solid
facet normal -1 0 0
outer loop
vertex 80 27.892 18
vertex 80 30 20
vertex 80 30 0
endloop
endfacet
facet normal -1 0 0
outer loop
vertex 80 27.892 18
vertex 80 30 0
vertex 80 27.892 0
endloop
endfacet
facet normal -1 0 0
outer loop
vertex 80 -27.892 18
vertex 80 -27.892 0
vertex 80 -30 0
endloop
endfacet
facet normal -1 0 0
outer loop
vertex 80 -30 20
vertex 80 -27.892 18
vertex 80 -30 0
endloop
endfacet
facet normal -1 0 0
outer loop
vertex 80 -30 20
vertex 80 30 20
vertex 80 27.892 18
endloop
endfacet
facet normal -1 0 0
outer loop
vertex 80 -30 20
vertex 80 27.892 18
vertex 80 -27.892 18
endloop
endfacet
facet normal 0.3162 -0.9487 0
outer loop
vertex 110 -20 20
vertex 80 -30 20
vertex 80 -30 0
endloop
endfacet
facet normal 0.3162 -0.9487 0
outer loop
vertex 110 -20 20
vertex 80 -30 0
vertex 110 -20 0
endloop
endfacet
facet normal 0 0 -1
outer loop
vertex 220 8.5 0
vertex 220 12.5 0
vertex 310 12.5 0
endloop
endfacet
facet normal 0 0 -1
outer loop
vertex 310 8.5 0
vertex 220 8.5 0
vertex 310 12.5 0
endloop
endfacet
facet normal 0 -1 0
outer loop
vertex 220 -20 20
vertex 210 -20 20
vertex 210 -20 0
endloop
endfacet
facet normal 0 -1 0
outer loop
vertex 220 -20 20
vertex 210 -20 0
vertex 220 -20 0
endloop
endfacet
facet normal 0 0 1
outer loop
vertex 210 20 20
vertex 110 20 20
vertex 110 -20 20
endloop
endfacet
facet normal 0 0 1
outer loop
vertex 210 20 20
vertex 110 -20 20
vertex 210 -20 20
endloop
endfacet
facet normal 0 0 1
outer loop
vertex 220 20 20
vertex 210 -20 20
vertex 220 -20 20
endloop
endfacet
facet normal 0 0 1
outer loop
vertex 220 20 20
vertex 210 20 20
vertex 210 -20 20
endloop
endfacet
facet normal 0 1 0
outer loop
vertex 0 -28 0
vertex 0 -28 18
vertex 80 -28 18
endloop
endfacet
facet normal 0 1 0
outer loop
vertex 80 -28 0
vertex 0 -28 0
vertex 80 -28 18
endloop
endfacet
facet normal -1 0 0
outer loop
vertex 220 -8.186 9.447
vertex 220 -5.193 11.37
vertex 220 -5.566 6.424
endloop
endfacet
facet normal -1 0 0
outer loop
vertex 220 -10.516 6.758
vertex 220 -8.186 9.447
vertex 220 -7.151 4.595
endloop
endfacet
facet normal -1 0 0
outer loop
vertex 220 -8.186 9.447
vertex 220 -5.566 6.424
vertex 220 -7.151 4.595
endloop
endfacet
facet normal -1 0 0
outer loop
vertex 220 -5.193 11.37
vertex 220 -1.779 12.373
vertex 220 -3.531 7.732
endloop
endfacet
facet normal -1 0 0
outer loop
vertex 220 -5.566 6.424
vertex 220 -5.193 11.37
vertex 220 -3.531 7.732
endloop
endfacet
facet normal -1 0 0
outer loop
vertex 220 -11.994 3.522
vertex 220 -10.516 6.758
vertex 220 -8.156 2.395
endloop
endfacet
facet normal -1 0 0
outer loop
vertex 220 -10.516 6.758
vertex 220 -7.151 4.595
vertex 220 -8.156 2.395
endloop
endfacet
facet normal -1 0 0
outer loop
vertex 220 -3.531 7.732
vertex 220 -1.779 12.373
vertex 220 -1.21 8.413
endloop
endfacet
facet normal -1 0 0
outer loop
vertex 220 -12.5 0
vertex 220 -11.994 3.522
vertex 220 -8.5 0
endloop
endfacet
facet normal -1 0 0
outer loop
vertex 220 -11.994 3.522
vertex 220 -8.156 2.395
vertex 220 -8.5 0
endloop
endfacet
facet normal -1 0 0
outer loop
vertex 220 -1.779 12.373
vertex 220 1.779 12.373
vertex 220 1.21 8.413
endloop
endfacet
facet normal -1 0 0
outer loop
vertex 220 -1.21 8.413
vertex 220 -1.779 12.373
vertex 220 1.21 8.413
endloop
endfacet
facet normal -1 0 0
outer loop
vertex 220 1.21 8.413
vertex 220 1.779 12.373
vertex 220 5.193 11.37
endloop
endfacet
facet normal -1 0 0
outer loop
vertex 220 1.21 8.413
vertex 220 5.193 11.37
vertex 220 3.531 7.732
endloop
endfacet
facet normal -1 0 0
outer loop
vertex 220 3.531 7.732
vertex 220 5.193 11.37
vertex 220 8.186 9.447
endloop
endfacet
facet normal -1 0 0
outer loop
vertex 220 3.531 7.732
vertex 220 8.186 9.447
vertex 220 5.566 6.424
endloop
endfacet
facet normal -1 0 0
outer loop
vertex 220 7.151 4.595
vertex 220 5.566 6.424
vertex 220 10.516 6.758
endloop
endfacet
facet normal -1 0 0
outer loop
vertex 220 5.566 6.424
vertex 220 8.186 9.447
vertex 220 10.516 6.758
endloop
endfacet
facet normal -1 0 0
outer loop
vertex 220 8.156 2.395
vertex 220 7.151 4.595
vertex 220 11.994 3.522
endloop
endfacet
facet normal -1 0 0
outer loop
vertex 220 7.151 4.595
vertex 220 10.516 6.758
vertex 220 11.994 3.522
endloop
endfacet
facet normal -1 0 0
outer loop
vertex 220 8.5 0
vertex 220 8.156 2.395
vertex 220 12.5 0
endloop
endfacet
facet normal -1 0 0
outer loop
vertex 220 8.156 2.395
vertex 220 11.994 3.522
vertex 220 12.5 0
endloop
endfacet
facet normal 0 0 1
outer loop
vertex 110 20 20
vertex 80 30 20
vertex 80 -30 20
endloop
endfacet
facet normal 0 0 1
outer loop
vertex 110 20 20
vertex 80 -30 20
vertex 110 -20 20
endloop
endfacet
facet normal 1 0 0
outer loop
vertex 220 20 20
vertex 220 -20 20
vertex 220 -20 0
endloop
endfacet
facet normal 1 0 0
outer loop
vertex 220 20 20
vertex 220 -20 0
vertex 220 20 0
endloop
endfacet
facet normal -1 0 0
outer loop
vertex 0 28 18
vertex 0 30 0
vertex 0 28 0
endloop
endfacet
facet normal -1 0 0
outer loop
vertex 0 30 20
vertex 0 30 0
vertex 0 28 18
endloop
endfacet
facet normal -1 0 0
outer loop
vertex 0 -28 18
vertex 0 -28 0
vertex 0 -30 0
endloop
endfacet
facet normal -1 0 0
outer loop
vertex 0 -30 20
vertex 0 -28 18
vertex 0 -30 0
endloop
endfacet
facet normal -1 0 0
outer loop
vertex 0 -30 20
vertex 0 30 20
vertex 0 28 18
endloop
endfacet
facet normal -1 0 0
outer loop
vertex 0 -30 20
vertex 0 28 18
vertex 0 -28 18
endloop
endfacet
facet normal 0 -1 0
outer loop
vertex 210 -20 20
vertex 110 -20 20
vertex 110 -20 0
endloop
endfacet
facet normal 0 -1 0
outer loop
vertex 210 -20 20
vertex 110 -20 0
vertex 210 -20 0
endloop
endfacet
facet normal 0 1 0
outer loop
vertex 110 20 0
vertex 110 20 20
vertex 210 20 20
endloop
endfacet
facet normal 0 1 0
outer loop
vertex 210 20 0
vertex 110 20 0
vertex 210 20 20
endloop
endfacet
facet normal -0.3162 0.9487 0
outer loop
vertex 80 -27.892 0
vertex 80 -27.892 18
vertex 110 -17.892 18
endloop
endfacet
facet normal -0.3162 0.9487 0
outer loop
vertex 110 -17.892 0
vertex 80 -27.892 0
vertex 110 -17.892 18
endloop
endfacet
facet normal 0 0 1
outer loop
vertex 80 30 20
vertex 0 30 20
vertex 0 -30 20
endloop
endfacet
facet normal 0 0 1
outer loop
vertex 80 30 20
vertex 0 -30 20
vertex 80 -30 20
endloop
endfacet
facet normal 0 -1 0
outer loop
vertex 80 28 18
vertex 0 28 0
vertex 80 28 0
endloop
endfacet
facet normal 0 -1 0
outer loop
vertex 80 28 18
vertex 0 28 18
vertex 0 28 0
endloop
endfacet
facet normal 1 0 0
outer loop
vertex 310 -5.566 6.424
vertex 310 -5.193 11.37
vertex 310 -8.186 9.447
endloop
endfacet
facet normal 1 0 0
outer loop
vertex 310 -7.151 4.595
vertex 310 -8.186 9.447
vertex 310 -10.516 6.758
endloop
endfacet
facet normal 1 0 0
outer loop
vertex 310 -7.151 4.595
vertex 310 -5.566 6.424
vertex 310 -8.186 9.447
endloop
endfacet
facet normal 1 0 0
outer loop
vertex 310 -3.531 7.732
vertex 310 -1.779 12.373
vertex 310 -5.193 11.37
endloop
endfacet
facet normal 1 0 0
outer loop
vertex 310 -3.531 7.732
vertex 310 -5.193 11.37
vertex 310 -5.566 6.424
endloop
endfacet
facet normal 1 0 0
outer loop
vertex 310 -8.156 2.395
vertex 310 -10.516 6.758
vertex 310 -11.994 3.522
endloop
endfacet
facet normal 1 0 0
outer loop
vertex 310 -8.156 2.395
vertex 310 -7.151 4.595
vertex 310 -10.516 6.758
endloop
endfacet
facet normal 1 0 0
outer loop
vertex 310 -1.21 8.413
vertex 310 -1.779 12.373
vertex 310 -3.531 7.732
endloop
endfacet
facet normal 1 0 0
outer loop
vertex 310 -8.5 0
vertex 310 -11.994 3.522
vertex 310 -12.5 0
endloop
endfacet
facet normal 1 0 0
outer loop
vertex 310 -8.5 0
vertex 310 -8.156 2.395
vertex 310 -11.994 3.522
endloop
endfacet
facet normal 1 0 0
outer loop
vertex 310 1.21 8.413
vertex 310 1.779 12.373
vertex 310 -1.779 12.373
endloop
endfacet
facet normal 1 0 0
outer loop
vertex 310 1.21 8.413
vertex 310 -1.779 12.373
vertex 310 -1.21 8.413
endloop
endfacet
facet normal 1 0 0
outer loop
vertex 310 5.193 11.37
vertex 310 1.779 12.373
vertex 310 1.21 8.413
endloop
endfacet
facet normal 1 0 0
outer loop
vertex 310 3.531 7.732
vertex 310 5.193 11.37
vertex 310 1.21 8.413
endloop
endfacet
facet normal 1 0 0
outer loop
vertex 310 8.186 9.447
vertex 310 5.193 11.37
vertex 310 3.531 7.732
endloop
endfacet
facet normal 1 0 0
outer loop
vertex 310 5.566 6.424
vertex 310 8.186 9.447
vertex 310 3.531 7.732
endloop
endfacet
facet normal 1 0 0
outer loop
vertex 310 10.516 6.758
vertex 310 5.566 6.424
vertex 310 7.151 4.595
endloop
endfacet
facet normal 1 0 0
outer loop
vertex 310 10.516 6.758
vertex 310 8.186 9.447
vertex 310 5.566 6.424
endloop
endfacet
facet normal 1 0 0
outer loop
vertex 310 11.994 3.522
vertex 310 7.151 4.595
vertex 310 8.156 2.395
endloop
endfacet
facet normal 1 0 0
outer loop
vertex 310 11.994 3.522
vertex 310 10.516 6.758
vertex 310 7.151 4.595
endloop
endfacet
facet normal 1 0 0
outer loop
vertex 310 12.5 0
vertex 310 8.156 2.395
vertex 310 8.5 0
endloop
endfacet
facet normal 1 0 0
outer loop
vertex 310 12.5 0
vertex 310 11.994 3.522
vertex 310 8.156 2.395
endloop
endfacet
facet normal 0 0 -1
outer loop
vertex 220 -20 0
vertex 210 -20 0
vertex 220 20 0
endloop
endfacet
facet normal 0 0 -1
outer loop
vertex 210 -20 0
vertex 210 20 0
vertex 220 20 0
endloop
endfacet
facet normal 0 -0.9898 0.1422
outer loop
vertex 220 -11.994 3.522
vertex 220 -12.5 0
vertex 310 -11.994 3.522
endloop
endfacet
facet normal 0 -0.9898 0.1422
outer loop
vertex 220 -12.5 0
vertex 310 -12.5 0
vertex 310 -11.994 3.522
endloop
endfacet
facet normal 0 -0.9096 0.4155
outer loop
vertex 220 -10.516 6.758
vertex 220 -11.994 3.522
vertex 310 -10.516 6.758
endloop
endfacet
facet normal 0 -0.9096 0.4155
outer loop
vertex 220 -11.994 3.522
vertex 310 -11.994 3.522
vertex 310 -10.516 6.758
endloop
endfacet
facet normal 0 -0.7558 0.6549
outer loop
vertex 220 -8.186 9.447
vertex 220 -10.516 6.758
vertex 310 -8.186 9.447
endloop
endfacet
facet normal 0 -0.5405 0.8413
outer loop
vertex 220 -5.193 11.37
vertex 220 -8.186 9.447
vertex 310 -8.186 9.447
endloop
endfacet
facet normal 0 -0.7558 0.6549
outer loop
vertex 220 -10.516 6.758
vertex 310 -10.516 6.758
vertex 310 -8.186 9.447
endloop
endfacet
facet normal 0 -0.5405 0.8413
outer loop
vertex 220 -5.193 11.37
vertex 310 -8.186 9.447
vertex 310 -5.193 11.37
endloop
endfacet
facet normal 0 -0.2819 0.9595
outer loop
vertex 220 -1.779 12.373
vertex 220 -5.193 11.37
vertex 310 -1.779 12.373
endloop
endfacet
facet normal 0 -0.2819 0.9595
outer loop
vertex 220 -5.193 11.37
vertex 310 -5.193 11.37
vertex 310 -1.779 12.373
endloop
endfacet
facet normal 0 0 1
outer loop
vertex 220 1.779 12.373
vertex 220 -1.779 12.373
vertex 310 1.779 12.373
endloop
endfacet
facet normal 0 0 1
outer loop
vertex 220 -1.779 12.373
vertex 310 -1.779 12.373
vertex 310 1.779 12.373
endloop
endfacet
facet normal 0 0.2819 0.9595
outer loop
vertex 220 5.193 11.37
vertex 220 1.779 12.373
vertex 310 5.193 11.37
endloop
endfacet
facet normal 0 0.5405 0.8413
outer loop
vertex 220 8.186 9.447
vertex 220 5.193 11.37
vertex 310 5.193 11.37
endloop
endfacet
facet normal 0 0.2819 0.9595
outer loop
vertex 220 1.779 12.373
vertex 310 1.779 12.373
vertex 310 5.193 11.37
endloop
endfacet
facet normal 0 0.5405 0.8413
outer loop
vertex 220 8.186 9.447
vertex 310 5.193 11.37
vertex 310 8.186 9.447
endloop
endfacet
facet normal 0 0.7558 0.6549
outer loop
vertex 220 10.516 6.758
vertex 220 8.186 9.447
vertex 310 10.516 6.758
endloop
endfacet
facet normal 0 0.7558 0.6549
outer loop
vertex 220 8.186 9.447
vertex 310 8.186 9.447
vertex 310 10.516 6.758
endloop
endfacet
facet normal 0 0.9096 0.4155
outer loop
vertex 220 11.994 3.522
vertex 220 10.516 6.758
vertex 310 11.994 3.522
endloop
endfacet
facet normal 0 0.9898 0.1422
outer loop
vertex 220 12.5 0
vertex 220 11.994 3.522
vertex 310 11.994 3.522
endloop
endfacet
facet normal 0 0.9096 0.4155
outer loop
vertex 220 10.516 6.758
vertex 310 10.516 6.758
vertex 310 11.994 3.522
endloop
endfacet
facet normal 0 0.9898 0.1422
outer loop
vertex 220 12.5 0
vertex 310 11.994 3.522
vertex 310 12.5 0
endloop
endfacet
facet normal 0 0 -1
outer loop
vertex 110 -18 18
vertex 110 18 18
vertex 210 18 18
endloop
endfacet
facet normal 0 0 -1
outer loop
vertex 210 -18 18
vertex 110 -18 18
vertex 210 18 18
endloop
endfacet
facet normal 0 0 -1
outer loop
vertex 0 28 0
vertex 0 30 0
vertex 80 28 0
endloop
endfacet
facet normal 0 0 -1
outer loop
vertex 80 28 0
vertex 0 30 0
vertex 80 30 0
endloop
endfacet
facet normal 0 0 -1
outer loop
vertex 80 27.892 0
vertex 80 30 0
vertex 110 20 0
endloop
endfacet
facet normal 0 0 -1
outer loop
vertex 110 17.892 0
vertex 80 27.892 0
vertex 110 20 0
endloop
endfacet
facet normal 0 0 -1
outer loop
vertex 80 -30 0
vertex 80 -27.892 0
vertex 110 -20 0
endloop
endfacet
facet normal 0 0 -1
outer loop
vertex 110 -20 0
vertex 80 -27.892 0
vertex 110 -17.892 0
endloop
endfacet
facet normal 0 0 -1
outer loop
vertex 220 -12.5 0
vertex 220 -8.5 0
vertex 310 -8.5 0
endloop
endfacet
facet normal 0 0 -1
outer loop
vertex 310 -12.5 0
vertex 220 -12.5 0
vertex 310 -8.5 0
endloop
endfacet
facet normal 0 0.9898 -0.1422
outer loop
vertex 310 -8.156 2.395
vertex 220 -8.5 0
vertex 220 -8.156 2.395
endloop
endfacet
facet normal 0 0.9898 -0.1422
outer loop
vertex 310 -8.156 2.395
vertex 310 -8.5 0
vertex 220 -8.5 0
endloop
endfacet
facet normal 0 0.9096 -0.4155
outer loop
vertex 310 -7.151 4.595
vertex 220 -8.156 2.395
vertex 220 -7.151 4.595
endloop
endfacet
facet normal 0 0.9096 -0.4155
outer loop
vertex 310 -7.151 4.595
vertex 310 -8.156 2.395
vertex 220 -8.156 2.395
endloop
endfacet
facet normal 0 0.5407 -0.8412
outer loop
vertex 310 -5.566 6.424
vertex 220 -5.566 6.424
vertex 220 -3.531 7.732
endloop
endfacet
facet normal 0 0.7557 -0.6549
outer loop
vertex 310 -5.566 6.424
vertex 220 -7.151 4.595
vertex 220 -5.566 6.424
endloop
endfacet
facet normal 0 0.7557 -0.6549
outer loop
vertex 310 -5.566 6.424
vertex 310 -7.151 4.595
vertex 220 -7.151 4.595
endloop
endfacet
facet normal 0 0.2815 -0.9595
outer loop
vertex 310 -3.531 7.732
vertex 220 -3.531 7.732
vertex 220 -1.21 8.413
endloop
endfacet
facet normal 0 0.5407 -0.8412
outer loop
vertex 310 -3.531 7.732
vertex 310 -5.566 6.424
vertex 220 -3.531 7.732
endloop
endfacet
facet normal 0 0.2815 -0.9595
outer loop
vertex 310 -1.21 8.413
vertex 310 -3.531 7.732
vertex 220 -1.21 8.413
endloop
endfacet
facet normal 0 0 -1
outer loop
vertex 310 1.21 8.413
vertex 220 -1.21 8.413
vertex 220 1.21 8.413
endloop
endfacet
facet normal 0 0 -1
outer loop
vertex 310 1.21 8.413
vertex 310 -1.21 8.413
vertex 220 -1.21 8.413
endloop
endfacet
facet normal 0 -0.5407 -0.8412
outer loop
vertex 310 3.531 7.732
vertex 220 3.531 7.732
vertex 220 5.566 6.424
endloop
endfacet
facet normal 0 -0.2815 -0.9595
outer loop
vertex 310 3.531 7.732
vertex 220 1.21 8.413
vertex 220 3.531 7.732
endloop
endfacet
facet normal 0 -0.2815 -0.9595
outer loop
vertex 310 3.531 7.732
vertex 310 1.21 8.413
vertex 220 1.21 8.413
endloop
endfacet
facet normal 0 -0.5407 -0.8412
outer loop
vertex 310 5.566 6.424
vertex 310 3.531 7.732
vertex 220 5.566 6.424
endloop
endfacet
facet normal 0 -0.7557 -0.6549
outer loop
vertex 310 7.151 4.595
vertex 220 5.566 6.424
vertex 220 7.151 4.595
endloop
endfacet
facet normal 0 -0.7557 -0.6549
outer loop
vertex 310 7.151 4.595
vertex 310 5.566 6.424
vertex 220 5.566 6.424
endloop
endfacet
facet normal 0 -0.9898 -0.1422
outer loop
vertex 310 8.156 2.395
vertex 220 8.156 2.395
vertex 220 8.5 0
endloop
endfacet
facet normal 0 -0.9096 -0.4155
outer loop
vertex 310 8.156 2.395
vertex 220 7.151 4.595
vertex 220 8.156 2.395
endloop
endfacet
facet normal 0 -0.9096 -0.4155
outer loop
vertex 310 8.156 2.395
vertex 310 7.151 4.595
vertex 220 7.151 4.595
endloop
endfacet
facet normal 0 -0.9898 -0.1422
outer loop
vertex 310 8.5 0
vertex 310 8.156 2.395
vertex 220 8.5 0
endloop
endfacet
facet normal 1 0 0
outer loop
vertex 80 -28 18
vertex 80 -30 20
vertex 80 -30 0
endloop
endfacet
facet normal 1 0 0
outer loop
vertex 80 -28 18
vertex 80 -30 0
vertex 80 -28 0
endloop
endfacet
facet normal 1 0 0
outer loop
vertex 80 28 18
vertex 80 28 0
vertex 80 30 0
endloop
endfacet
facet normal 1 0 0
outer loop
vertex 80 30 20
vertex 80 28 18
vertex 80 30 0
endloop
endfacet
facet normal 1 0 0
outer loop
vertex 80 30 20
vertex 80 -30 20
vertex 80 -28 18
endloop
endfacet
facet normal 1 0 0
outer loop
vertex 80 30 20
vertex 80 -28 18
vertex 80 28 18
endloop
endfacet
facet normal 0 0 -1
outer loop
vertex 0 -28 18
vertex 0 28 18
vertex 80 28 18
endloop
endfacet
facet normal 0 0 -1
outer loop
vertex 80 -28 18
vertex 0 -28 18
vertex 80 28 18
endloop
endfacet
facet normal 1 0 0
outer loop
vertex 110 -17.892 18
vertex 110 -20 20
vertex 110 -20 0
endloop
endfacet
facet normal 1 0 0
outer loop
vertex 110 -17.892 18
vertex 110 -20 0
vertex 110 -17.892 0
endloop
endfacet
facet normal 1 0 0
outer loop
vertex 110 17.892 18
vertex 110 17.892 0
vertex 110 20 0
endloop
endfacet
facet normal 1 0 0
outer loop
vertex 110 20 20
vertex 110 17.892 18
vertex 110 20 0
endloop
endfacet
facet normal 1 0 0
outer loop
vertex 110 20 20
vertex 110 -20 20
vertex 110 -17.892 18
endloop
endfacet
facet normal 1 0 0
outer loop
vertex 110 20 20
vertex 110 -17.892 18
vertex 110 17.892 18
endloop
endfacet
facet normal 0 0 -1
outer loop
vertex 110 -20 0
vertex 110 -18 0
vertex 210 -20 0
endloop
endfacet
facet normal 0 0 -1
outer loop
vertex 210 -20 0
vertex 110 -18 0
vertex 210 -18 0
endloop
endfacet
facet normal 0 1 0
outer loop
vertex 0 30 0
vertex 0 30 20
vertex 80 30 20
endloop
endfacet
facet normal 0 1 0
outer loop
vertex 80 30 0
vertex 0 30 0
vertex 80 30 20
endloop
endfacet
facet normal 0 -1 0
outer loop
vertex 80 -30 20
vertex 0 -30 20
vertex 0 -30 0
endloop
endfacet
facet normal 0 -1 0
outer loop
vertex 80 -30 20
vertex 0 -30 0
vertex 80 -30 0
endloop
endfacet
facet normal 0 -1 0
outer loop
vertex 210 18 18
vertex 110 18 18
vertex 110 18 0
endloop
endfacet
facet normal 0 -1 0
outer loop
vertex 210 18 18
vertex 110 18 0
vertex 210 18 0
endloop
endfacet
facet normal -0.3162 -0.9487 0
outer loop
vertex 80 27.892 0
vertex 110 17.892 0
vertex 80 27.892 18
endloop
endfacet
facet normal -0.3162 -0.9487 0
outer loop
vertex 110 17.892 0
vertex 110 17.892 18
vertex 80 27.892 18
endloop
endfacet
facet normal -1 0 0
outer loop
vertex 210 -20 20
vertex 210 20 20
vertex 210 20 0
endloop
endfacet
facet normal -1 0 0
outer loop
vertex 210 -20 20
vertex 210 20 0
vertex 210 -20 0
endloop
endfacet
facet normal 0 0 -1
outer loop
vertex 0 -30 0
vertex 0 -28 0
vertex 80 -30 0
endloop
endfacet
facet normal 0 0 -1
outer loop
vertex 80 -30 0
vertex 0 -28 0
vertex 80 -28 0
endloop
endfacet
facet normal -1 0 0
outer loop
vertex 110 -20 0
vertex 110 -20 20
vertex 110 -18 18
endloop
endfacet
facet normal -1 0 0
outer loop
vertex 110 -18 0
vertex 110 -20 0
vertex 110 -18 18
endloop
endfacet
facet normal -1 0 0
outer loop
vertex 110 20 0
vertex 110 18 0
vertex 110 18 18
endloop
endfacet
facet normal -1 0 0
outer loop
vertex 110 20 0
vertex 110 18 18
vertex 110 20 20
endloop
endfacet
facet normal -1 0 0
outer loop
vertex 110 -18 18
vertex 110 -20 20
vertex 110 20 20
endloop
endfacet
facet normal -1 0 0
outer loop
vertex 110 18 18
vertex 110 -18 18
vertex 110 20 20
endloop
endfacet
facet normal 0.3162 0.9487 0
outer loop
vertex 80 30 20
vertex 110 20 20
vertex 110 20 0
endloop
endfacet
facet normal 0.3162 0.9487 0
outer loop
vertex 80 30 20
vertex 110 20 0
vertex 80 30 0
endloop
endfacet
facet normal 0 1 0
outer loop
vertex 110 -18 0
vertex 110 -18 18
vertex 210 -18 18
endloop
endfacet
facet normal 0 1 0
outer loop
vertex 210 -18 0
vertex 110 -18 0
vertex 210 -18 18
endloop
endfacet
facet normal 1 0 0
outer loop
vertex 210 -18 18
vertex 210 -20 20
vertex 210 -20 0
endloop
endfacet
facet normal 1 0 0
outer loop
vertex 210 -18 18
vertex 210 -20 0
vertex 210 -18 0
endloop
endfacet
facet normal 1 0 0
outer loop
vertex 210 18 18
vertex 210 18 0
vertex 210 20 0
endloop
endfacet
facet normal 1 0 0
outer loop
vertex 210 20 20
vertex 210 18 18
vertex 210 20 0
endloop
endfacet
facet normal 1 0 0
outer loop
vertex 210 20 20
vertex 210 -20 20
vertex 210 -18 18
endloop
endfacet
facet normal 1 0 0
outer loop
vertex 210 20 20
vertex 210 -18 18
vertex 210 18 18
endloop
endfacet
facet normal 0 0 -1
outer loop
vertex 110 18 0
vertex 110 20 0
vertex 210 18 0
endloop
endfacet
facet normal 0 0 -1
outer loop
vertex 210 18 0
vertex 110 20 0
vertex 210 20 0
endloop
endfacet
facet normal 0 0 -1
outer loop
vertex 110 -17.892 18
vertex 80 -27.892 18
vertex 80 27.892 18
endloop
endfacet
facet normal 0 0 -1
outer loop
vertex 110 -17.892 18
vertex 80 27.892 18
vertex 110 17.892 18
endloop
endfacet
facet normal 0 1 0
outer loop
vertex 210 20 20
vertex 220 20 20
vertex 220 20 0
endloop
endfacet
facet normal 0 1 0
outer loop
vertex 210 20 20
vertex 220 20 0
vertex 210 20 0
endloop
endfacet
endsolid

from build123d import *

# Parameters (mm, degrees)
CROQUIS1_W              = 80
CROQUIS1_H              = 60
SALIENTE_EXTRUIR1_DEPTH = 20
SALIENTE_EXTRUIR2_DEPTH = 20
CROQUIS1_4_W            = 100
CROQUIS1_4_H            = 40
SALIENTE_EXTRUIR3_DEPTH = 20
VACIADO1_T              = -2
SALIENTE_EXTRUIR4_DEPTH = 20
CROQUIS1_6_W            = 90
CROQUIS1_6_H            = 4
VACIADO2_T              = -2
VACIADO3_T              = -2
CORTAR_EXTRUIR2_DEPTH   = 72


with BuildPart() as part:
    # Croquis1 → Saliente-Extruir1 (new, symmetric)
    with BuildSketch(Plane.XY):
        with Locations((40, 0)):
            Rectangle(CROQUIS1_W, CROQUIS1_H)
    extrude(amount=SALIENTE_EXTRUIR1_DEPTH, both=True)

    # Vaciado1
    vaciado1_openings = [part.faces().sort_by_distance(p)[0] for p in [
        (80, 0, 0),
        (0, 0, 0),
    ]]
    offset(amount=VACIADO1_T, openings=vaciado1_openings, kind=Kind.INTERSECTION)


with BuildPart() as body_2:
    # Croquis1<3> → Saliente-Extruir2 (new, symmetric)
    with BuildSketch(Plane.XY):
        Polygon((80, 30), (80, -30), (110, -20), (110, 20), align=None)
    extrude(amount=SALIENTE_EXTRUIR2_DEPTH, both=True)

    # Vaciado2
    vaciado2_openings = [body_2.faces().sort_by_distance(p)[0] for p in [
        (110, 0, 0),
        (80, 0, 0),
    ]]
    offset(amount=VACIADO2_T, openings=vaciado2_openings, kind=Kind.INTERSECTION)


with BuildPart() as body_3:
    # Croquis1<4> → Saliente-Extruir3 (new, symmetric)
    with BuildSketch(Plane.XY):
        with Locations((160, 0)):
            Rectangle(CROQUIS1_4_W, CROQUIS1_4_H)
    extrude(amount=SALIENTE_EXTRUIR3_DEPTH, both=True)

    # Vaciado3
    vaciado3_openings = [body_3.faces().sort_by_distance(p)[0] for p in [
        (210, 0, 0),
        (110, 0, 0),
    ]]
    offset(amount=VACIADO3_T, openings=vaciado3_openings, kind=Kind.INTERSECTION)


with BuildPart() as body_4:
    # Croquis1<7> → Saliente-Extruir4 (new, symmetric)
    with BuildSketch(Plane.XY):
        Polygon((210, 20), (210, -20), (220, -20), (220, -12.5), (220, -8.5), (220, 8.5), (220, 12.5), (220, 20), align=None)
    extrude(amount=SALIENTE_EXTRUIR4_DEPTH, both=True)


with BuildPart() as body_5:
    # Croquis1<6> → Revolución1 (revolve)
    with BuildSketch(Plane.XY):
        with Locations((265, 10.5)):
            Rectangle(CROQUIS1_6_W, CROQUIS1_6_H)
    revolve(axis=Axis((210, 0, 0), (-1, 0, 0)))


with BuildPart() as cortar_extruir2_tool:
    # Croquis6 → Cortar-Extruir2 (new, symmetric)
    with BuildSketch(Plane(origin=(0, 0, 0), x_dir=(1, 0, 0), z_dir=(0, 1, 0))):
        Polygon((0, 0), (340.896123577, 0), (340.896123577, 59.379495174), (-32.701047908, 59.379495174), (-32.701047908, 29.689747587), align=None)
    extrude(amount=CORTAR_EXTRUIR2_DEPTH, both=True)


with BuildPart() as part_1:
    add(part.part)

    # Cortar-Extruir2: cut by cortar_extruir2_tool
    add(cortar_extruir2_tool.part, mode=Mode.SUBTRACT)


with BuildPart() as body_2_1:
    add(body_2.part)

    # Cortar-Extruir2: cut by cortar_extruir2_tool
    add(cortar_extruir2_tool.part, mode=Mode.SUBTRACT)


with BuildPart() as body_3_1:
    add(body_3.part)

    # Cortar-Extruir2: cut by cortar_extruir2_tool
    add(cortar_extruir2_tool.part, mode=Mode.SUBTRACT)


with BuildPart() as body_4_1:
    add(body_4.part)

    # Cortar-Extruir2: cut by cortar_extruir2_tool
    add(cortar_extruir2_tool.part, mode=Mode.SUBTRACT)


with BuildPart() as body_5_1:
    add(body_5.part)

    # Cortar-Extruir2: cut by cortar_extruir2_tool
    add(cortar_extruir2_tool.part, mode=Mode.SUBTRACT)


solid = Compound([part_1.part, body_2_1.part, body_3_1.part, body_4_1.part, body_5_1.part])
